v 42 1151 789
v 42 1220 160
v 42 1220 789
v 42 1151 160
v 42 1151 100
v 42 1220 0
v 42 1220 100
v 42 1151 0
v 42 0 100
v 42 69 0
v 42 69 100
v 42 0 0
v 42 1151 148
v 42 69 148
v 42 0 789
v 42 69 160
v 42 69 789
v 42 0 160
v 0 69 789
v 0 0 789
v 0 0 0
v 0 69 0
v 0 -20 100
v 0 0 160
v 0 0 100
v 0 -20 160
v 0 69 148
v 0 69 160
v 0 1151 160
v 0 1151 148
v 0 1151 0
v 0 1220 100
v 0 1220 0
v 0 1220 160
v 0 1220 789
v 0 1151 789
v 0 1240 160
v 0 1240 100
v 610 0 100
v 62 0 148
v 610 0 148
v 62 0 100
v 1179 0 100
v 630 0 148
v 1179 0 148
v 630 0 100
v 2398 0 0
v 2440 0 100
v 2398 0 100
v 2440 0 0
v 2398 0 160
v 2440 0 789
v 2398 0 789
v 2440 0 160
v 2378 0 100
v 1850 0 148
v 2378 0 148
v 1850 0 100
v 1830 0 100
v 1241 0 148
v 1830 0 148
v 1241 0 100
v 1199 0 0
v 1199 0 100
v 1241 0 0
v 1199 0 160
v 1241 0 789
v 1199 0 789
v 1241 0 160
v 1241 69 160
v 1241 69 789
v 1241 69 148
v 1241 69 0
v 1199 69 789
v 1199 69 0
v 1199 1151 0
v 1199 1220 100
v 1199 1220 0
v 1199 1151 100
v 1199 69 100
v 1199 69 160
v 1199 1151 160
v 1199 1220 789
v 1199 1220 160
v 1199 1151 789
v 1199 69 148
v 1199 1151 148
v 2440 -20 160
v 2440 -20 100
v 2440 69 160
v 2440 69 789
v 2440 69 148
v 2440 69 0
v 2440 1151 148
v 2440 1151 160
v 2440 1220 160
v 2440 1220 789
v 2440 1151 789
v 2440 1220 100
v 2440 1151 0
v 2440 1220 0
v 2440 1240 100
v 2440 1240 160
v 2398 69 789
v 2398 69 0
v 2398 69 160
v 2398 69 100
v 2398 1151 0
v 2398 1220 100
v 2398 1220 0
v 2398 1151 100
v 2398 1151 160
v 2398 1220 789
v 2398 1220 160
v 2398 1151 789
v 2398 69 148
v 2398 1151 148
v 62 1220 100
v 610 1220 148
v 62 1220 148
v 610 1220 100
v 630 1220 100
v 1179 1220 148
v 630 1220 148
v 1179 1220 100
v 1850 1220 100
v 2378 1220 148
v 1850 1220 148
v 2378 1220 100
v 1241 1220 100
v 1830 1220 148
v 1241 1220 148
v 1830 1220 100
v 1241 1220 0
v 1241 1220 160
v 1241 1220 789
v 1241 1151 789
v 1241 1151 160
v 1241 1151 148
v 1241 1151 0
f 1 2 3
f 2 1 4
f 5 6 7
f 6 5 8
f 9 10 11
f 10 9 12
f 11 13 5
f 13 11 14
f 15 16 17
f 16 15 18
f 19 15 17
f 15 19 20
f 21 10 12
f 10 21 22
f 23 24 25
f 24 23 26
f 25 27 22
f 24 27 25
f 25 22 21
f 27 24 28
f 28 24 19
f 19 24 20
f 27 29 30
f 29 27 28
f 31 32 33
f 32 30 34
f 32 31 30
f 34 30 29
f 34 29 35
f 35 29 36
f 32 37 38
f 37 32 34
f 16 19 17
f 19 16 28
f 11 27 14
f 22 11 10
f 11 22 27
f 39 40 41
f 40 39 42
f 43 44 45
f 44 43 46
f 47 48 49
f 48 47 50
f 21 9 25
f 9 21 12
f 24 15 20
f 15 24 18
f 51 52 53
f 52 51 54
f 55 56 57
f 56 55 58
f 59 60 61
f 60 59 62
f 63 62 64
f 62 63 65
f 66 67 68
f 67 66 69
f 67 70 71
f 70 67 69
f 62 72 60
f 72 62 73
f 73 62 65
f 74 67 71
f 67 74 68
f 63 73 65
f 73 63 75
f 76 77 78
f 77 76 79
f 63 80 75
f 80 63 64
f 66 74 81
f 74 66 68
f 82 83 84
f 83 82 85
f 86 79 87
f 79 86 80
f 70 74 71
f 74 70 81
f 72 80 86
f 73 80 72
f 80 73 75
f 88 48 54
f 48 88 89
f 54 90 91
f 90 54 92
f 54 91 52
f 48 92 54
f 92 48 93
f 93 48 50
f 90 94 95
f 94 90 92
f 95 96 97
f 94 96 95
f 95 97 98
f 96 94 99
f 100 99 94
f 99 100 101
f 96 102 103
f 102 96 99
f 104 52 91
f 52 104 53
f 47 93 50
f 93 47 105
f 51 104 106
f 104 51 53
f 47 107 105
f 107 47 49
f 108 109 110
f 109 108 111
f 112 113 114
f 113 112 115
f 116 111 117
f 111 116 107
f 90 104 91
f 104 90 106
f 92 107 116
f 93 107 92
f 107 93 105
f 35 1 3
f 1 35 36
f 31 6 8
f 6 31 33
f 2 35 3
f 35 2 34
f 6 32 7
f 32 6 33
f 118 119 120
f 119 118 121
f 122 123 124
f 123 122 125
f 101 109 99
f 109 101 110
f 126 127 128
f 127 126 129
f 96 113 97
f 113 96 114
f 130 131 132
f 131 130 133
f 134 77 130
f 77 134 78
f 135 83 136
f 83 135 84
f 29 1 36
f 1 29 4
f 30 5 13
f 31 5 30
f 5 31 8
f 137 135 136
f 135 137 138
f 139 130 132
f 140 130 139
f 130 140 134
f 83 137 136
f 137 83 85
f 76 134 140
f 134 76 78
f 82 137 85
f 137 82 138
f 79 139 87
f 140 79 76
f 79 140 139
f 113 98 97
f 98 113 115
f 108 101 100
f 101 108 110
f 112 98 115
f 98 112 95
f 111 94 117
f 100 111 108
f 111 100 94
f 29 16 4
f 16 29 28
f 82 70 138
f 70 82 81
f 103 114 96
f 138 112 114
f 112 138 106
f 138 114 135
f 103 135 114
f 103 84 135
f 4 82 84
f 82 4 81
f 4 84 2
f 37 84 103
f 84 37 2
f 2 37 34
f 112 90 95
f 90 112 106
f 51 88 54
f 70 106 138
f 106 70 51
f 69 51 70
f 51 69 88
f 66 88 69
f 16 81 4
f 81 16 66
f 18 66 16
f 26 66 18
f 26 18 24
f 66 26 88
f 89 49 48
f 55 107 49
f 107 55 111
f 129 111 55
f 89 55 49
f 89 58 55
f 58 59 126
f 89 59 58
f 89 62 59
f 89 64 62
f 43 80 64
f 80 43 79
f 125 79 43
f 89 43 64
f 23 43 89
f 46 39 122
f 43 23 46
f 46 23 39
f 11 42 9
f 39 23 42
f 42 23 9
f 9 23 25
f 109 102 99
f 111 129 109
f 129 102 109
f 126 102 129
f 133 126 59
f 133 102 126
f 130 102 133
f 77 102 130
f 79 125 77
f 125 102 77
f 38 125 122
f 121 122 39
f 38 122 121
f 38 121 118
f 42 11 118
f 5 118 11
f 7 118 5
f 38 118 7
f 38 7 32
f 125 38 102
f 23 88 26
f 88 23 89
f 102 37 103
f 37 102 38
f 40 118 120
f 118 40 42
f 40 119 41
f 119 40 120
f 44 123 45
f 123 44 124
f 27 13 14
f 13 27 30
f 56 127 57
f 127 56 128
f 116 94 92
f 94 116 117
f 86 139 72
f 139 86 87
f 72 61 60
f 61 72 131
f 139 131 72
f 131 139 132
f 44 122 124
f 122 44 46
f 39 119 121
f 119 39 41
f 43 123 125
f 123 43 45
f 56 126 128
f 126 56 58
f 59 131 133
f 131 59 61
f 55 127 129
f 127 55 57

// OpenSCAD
/*

    Bottom
    
    By Anton Augustsson


*/



module bottom (
    standardSheathingWidth,
    standardSheathingLength,
    plywoodTopThickness,
    legLength,
    legWidth,
    legThickness,
    listBottomThickness,
    listBottomWidth1,
    listBottomLengthX,
    listBottomLengthY,
    listBottomLengthY2,
    bottomHeight,
    x,y,z
    ){
/*
    ---------- Local varibles ---------- 
*/


/*
    ---------- Code ---------- 
*/

translate([
    x,
    y,
    z]) 
color("Wheat")
union () {

// leg 1
translate([
    0,
    0,
    0]) 
cube(size = [
    legThickness,
    legWidth,
    legLength]);

// leg 2
translate([
    standardSheathingLength/2
    -legThickness/2,
    0,
    0]) 
cube(size = [
    legThickness,
    legWidth,
    legLength]);

// leg 3
translate([
    standardSheathingLength
    -legThickness,
    0,
    0]) 
cube(size = [
    legThickness,
    legWidth,
    legLength]);

// leg 4
translate([
    0,
    standardSheathingWidth-legWidth,
    0]) 
cube(size = [
    legThickness,
    legWidth,
    legLength]);

// leg 5
translate([
    standardSheathingLength/2
    -legThickness/2,
    standardSheathingWidth-legWidth,
    0]) 
cube(size = [
    legThickness,
    legWidth,
    legLength]);

// leg 6
translate([
    standardSheathingLength
    -legThickness,
    standardSheathingWidth-legWidth,
    0]) 
cube(size = [
    legThickness,
    legWidth,
    legLength]);


// ---------- Bottom ----------
// front bottom list
translate([
    0,
    -listBottomThickness,
    bottomHeight]) 
cube(size = [
    listBottomLengthX,
    listBottomThickness,
    listBottomWidth1]);

// back bottom list
translate([
    0,
    standardSheathingWidth,
    bottomHeight]) 
cube(size = [
    listBottomLengthX,
    listBottomThickness,
    listBottomWidth1]);

// left bottom list
translate([
    legThickness,
    0,
    bottomHeight]) 
cube(size = [
    listBottomThickness,
    listBottomLengthY,
    listBottomWidth2]);

// midle left bottom list
translate([
    standardSheathingLength/4,
    0,
    bottomHeight]) 
cube(size = [
    listBottomThickness,
    listBottomLengthY,
    listBottomWidth2]);

// midle bottom list
translate([
    standardSheathingLength/2
    -legThickness/2
    -listBottomThickness,
    0,
    bottomHeight]) 
cube(size = [
    listBottomThickness,
    listBottomLengthY,
    listBottomWidth2]);

// midle right bottom list
translate([
    standardSheathingLength/4*3,
    0,
    bottomHeight]) 
cube(size = [
    listBottomThickness,
    listBottomLengthY,
    listBottomWidth2]);

// right bottom list
translate([
    standardSheathingLength
    -legThickness
    -listBottomThickness,
    0,
    bottomHeight]) 
cube(size = [
    listBottomThickness,
    listBottomLengthY,
    listBottomWidth2]);


// bottom ply
translate([
    0,
    0,
    bottomHeight+listBottomWidth2]) 
cube(size = [
    standardSheathingLength,
    standardSheathingWidth,
    plywoodTopThickness]);

}}
    
/*
    ---------- Example ---------- 
*/

standardSheathingWidth = 1220; 
standardSheathingLength = 2440;

mdfTopThickness = 19;
plywoodTopThickness = 12;

// Side protection for ply and mdf
edgeTopThickness = 20; 
edgeTopWidth = 167;
edgeTopLengthX = standardSheathingLength
    +2*edgeTopThickness;
edgeTopLengthY = standardSheathingWidth
    +2*edgeTopThickness;

// 4 list betweend mdf and ply (Pine)
listTopThickness = 20; 
listTopWidth = 80;
listTopLengthX = standardSheathingLength/4
    -listTopThickness;
listTopLengthY = standardSheathingWidth;

// 6 legs (Pine)
legLength = 900
    -plywoodTopThickness
    -mdfTopThickness
    -listTopWidth;
legWidth = 69;
legThickness = 42;

// 3 bottom list (Pine)
listBottomThickness = 20; 
listBottomWidth1 = 60;
listBottomWidth2 = listBottomWidth1
    -plywoodTopThickness;
listBottomLengthX = standardSheathingLength;
listBottomLengthY = standardSheathingWidth;
listBottomLengthY2 = standardSheathingWidth
    +listBottomThickness*2;
bottomHeight = 100;

storageUnitLength=standardSheathingLength/2
    -legThickness*3/2;
storageUnitWidth=400;  
storageUnitHeight=(900-edgeTopWidth)
    -(bottomHeight+listBottomWidth2);
storageUnitThickness=12;


thickness= 12;

length = 500;
width  = 600;
height = 400;

x=0;
y=0;
z=0;
yRotate=0;

bottom (
    standardSheathingWidth,
    standardSheathingLength,
    plywoodTopThickness,
    legLength,
    legWidth,
    legThickness,
    listBottomThickness,
    listBottomWidth1,
    listBottomLengthX,
    listBottomLengthY,
    listBottomLengthY2,
    bottomHeight,
    x,y,z
    );
